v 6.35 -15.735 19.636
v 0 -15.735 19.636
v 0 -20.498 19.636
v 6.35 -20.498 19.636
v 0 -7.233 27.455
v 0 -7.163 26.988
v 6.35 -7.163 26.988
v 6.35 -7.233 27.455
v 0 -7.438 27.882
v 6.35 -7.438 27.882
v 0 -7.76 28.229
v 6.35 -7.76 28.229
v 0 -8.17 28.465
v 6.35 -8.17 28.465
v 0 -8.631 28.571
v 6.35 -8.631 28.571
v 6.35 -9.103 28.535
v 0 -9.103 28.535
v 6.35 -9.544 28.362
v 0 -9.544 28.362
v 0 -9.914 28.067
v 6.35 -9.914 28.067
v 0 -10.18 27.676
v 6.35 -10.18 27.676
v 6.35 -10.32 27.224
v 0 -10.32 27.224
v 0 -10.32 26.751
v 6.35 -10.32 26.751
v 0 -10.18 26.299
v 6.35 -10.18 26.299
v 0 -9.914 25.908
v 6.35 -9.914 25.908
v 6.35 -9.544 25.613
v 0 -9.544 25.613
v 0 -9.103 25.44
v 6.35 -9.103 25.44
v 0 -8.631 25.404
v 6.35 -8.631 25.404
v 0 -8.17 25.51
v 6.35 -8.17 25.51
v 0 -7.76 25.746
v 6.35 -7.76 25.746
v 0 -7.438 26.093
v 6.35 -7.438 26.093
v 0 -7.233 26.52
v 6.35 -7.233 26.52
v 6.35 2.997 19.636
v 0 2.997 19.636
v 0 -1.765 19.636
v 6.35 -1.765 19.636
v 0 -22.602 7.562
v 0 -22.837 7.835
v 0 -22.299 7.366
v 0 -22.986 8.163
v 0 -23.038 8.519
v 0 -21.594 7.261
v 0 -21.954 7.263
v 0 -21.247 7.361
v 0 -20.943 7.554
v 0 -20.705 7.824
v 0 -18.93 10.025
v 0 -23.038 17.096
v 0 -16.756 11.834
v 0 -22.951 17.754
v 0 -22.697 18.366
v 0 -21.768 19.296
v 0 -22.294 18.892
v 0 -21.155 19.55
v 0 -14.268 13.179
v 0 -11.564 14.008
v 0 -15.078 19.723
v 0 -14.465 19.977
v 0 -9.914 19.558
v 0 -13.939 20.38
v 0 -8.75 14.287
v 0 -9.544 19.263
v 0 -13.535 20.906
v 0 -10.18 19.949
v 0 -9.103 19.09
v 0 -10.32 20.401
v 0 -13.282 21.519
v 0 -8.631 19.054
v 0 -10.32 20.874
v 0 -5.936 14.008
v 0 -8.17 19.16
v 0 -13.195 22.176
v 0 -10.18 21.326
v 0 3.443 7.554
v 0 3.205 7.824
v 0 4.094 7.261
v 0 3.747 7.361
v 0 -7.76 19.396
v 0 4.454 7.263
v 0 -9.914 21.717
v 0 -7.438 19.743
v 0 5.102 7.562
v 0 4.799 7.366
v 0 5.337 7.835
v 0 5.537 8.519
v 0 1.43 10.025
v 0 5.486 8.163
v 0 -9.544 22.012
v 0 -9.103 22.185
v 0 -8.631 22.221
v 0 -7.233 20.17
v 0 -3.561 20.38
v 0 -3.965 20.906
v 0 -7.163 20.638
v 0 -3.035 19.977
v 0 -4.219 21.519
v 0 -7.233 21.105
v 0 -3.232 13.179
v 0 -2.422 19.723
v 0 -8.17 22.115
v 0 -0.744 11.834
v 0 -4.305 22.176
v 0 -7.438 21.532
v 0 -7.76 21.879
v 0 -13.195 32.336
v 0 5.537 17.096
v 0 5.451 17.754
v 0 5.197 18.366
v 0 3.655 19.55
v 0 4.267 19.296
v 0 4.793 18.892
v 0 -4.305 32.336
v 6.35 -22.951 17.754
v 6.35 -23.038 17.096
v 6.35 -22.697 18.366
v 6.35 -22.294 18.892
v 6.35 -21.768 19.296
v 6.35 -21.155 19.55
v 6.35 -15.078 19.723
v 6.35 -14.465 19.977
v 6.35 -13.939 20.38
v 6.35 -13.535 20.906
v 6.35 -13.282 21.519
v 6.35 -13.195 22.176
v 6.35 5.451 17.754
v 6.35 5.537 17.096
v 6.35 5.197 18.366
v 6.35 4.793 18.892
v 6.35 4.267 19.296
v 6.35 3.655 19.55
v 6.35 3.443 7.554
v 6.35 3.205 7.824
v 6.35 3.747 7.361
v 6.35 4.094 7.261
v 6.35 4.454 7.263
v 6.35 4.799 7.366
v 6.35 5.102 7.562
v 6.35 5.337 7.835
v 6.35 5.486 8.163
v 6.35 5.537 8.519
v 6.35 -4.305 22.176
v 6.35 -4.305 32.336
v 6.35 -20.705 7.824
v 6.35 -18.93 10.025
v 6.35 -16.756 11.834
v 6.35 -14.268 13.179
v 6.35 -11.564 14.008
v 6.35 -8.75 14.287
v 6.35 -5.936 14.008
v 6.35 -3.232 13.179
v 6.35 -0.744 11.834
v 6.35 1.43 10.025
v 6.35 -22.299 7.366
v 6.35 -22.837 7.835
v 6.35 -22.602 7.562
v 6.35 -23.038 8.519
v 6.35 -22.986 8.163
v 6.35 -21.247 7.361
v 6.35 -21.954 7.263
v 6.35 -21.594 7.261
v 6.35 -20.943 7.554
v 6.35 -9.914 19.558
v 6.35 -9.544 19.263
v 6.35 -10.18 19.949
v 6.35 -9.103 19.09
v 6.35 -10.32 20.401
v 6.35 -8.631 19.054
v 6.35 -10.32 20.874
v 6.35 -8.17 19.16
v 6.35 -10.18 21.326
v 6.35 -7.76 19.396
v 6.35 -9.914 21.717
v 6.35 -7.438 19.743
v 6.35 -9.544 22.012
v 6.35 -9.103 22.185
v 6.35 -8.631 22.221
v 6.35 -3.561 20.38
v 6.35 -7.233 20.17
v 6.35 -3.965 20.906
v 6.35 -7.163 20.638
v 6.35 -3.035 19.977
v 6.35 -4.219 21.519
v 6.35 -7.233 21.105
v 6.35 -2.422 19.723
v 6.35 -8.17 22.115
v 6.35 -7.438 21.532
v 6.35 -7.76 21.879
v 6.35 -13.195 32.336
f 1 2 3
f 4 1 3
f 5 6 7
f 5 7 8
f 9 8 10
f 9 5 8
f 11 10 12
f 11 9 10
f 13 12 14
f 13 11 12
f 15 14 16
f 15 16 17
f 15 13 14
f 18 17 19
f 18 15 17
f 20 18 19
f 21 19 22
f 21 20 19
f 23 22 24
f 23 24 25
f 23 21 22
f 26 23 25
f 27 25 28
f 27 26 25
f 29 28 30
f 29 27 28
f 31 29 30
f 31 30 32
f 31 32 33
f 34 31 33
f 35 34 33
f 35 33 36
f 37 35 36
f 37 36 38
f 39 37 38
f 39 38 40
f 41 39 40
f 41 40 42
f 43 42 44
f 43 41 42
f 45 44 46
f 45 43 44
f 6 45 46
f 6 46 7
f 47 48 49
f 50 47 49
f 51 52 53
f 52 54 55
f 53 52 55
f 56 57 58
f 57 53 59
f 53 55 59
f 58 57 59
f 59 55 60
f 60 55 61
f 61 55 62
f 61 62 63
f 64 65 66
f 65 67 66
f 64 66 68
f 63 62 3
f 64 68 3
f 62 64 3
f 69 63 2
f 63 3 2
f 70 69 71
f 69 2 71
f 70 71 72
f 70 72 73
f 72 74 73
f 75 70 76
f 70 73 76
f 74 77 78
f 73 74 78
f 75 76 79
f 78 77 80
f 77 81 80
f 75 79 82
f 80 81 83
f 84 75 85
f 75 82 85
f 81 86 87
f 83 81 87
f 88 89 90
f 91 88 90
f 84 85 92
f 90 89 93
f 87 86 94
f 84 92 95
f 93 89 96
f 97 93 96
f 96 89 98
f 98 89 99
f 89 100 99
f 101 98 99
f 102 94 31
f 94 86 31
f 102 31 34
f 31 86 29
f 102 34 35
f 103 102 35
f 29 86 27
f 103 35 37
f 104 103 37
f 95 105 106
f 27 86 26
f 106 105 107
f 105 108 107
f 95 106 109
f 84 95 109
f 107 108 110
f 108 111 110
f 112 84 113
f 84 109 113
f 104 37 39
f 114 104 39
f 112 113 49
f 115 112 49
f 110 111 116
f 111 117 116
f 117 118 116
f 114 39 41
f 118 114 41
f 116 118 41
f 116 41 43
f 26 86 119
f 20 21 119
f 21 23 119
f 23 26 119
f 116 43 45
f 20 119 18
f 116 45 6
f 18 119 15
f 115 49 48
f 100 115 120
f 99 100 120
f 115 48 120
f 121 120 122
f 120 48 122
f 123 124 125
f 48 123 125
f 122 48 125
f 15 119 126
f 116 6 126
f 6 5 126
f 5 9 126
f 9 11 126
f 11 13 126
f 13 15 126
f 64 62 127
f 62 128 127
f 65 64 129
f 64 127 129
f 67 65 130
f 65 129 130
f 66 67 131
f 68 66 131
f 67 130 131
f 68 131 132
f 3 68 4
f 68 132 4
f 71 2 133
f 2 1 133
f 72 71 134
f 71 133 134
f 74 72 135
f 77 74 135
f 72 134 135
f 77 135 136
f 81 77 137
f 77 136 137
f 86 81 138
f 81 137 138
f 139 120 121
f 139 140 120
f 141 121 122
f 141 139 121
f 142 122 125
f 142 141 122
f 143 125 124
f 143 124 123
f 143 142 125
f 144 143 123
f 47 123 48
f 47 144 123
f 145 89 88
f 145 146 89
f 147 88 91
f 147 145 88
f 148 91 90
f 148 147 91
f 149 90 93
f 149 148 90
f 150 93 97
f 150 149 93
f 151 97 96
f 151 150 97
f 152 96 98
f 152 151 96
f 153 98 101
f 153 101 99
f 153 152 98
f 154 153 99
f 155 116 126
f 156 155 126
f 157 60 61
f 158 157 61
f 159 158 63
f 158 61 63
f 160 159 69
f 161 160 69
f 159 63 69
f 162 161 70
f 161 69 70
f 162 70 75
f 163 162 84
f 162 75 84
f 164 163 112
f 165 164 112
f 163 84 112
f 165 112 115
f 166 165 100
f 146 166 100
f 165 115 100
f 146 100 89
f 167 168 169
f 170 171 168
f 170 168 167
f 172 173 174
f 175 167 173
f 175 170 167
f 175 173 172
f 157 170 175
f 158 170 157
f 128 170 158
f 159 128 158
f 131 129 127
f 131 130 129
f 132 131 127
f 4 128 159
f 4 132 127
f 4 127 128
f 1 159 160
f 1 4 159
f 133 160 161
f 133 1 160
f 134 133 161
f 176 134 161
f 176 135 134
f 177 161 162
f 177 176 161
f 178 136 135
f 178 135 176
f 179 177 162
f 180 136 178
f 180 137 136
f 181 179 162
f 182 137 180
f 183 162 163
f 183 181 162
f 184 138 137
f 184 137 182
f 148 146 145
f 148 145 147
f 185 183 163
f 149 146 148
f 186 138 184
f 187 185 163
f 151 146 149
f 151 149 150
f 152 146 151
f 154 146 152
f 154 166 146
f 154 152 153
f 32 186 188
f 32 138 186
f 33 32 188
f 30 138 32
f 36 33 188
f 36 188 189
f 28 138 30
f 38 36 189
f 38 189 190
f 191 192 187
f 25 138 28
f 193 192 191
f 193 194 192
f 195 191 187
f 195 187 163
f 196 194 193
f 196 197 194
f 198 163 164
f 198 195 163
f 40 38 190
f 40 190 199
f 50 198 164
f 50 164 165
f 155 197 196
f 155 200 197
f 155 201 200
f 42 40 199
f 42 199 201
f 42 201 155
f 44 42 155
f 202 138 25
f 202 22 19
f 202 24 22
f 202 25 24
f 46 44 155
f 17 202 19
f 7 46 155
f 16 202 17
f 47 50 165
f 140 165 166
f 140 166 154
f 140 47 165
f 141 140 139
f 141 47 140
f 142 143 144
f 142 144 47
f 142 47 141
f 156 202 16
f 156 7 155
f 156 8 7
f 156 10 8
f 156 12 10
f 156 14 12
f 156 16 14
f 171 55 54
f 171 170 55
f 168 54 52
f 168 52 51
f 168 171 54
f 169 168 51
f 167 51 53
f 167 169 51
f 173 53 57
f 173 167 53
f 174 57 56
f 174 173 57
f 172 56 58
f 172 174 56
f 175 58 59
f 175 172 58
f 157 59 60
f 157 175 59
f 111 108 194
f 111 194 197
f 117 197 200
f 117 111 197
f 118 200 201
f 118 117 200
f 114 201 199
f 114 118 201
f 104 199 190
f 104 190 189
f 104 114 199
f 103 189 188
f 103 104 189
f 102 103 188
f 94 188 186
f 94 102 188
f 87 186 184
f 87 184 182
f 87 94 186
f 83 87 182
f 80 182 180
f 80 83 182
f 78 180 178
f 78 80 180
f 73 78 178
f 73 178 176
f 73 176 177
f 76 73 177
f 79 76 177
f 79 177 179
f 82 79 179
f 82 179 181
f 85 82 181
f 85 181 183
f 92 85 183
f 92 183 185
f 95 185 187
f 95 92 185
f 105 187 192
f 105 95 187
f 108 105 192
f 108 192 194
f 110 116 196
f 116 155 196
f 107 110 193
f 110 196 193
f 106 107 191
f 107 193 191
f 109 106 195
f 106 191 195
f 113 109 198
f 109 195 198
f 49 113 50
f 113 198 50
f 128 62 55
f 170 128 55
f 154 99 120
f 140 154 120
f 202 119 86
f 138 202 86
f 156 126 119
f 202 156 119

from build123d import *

# Parameters (mm, degrees)
F0_R     = 1.5875
F1_DEPTH = 6.35
F2_R     = 1.27
F3_R     = 2.54


# Not quite as in the source:
# - a feature names something its author has since deleted; it is built from what else it names


with BuildPart() as f1:
    # F0 (on Right) → F1 (new body)
    with BuildSketch(Plane.YZ):
        with BuildLine():
            Line((-23.0375597417, 19.636290542), (-23.0375597417, 0))
            ThreePointArc((-23.0375597417, 0), (-8.7500597417, 14.2875), (5.5374402583, 0))
            Line((5.5374402583, 0), (5.5374402583, 19.636290542))
            Line((5.5374402583, 19.636290542), (-4.3050597417, 19.636290542))
            Line((-4.3050597417, 19.636290542), (-4.3050597417, 32.336290542))
            Line((-4.3050597417, 32.336290542), (-13.1950597417, 32.336290542))
            Line((-13.1950597417, 32.336290542), (-13.1950597417, 19.636290542))
            Line((-13.1950597417, 19.636290542), (-23.0375597417, 19.636290542))
        make_face()
        with Locations((-8.7500597417, 20.6375)):
            Circle(F0_R, mode=Mode.SUBTRACT)
        with Locations((-8.7500597417, 26.9875)):
            Circle(F0_R, mode=Mode.SUBTRACT)
    extrude(amount=F1_DEPTH)

    # F2
    f2_edges = [f1.edges().sort_by_distance(p)[0] for p in [
        (3.175, -23.03756, 0),
        (3.175, 5.53744, 0),
    ]]
    fillet(f2_edges, radius=F2_R)

    # F3
    f3_edges = [f1.edges().sort_by_distance(p)[0] for p in [
        (3.175, -23.03756, 19.636291),
        (3.175, 5.53744, 19.636291),
        (3.175, -4.30506, 19.636291),
        (3.175, -13.19506, 19.636291),
    ]]
    fillet(f3_edges, radius=F3_R)


solid = f1.part
